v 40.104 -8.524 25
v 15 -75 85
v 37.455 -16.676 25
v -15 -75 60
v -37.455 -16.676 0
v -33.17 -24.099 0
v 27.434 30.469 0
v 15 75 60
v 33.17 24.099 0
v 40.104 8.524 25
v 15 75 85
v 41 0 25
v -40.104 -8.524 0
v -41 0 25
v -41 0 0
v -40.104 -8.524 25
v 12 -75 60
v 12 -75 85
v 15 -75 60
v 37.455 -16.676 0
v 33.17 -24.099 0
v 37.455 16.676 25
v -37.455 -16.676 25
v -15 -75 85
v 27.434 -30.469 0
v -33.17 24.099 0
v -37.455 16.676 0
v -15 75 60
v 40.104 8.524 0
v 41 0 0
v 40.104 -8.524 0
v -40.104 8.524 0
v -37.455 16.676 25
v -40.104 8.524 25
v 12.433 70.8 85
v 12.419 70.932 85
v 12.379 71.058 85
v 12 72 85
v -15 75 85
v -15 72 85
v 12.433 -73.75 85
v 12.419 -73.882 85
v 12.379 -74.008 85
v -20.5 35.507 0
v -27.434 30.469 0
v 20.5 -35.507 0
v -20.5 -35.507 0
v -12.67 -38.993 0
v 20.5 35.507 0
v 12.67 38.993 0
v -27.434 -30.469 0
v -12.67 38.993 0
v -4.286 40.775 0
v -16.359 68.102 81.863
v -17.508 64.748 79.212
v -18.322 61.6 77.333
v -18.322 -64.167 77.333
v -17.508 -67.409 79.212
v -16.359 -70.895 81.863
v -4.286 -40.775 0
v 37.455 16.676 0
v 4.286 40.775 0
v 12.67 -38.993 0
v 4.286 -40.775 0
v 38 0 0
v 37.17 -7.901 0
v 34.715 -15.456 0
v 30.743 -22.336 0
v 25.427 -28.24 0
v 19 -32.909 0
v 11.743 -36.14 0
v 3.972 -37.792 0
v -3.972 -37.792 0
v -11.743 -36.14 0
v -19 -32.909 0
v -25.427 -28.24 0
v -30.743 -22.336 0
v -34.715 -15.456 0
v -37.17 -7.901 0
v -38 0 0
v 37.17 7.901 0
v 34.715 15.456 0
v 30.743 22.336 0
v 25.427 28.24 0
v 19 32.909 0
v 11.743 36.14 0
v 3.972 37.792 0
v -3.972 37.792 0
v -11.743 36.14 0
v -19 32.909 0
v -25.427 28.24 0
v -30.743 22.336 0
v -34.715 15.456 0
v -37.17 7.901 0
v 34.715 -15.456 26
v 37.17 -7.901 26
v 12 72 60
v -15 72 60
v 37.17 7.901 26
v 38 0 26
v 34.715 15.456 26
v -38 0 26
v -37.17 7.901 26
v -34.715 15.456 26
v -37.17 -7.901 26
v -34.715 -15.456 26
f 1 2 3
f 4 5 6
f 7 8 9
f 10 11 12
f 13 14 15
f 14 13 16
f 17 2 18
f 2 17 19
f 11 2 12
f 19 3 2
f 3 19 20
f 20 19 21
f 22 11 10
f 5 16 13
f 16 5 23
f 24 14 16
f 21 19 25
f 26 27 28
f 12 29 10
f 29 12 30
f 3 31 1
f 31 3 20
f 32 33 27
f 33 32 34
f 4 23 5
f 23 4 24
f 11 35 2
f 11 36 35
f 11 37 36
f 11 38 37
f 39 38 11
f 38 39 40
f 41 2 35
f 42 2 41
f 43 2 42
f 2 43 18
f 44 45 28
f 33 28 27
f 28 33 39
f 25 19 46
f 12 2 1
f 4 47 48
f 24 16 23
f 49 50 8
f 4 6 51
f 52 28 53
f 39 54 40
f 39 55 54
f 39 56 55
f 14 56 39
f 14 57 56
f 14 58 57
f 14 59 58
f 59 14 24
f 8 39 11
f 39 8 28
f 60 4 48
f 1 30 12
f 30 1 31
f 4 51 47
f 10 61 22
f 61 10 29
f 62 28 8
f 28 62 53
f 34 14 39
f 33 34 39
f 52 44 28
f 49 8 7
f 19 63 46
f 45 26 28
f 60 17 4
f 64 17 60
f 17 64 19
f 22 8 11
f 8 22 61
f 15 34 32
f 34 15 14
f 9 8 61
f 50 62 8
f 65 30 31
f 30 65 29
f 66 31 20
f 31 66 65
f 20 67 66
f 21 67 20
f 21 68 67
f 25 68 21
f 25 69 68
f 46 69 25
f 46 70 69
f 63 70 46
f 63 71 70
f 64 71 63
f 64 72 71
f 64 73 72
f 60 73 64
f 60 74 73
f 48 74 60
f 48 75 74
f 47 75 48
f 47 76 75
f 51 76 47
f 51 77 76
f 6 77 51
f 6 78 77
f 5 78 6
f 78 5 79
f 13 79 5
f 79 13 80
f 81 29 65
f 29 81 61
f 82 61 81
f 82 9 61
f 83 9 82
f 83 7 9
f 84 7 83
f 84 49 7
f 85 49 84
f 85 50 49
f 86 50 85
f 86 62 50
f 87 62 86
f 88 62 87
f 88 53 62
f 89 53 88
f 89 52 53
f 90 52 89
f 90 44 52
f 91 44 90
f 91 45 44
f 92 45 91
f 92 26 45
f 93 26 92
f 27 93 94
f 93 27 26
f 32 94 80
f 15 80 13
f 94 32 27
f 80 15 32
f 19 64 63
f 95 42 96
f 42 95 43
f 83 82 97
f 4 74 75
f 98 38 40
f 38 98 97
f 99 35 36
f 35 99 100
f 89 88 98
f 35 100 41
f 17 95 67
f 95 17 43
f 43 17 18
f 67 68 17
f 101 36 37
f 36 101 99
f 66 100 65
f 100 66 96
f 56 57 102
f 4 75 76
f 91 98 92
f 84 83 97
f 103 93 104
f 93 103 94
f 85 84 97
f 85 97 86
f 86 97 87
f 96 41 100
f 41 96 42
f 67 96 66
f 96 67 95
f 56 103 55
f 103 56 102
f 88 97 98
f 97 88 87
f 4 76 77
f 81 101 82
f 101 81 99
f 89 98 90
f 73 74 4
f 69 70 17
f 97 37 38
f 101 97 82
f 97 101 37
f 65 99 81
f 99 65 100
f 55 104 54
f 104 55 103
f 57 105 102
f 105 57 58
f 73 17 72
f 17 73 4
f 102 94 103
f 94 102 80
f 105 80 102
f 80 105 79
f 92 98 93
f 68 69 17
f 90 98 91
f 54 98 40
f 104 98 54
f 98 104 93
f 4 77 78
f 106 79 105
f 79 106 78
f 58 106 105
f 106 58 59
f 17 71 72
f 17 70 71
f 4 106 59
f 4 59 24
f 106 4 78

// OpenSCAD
hosedia = 82/2;
hose_depth = 25;
window_width = 30;
window_length = 150;
window_depth = 25;

difference()
{
	hull()
	{
	cylinder(r=hosedia, h=hose_depth);
	translate([-window_width/2, -window_length/2,60])
	cube([window_width, window_length, window_depth]);
	}
	hull()
	{
	cylinder(r=hosedia - 3, h=hose_depth + 1);
	translate([-window_width/2, -window_length/2,60])
	cube([window_width - 3, window_length - 3, window_depth + 1]);
	}
}
